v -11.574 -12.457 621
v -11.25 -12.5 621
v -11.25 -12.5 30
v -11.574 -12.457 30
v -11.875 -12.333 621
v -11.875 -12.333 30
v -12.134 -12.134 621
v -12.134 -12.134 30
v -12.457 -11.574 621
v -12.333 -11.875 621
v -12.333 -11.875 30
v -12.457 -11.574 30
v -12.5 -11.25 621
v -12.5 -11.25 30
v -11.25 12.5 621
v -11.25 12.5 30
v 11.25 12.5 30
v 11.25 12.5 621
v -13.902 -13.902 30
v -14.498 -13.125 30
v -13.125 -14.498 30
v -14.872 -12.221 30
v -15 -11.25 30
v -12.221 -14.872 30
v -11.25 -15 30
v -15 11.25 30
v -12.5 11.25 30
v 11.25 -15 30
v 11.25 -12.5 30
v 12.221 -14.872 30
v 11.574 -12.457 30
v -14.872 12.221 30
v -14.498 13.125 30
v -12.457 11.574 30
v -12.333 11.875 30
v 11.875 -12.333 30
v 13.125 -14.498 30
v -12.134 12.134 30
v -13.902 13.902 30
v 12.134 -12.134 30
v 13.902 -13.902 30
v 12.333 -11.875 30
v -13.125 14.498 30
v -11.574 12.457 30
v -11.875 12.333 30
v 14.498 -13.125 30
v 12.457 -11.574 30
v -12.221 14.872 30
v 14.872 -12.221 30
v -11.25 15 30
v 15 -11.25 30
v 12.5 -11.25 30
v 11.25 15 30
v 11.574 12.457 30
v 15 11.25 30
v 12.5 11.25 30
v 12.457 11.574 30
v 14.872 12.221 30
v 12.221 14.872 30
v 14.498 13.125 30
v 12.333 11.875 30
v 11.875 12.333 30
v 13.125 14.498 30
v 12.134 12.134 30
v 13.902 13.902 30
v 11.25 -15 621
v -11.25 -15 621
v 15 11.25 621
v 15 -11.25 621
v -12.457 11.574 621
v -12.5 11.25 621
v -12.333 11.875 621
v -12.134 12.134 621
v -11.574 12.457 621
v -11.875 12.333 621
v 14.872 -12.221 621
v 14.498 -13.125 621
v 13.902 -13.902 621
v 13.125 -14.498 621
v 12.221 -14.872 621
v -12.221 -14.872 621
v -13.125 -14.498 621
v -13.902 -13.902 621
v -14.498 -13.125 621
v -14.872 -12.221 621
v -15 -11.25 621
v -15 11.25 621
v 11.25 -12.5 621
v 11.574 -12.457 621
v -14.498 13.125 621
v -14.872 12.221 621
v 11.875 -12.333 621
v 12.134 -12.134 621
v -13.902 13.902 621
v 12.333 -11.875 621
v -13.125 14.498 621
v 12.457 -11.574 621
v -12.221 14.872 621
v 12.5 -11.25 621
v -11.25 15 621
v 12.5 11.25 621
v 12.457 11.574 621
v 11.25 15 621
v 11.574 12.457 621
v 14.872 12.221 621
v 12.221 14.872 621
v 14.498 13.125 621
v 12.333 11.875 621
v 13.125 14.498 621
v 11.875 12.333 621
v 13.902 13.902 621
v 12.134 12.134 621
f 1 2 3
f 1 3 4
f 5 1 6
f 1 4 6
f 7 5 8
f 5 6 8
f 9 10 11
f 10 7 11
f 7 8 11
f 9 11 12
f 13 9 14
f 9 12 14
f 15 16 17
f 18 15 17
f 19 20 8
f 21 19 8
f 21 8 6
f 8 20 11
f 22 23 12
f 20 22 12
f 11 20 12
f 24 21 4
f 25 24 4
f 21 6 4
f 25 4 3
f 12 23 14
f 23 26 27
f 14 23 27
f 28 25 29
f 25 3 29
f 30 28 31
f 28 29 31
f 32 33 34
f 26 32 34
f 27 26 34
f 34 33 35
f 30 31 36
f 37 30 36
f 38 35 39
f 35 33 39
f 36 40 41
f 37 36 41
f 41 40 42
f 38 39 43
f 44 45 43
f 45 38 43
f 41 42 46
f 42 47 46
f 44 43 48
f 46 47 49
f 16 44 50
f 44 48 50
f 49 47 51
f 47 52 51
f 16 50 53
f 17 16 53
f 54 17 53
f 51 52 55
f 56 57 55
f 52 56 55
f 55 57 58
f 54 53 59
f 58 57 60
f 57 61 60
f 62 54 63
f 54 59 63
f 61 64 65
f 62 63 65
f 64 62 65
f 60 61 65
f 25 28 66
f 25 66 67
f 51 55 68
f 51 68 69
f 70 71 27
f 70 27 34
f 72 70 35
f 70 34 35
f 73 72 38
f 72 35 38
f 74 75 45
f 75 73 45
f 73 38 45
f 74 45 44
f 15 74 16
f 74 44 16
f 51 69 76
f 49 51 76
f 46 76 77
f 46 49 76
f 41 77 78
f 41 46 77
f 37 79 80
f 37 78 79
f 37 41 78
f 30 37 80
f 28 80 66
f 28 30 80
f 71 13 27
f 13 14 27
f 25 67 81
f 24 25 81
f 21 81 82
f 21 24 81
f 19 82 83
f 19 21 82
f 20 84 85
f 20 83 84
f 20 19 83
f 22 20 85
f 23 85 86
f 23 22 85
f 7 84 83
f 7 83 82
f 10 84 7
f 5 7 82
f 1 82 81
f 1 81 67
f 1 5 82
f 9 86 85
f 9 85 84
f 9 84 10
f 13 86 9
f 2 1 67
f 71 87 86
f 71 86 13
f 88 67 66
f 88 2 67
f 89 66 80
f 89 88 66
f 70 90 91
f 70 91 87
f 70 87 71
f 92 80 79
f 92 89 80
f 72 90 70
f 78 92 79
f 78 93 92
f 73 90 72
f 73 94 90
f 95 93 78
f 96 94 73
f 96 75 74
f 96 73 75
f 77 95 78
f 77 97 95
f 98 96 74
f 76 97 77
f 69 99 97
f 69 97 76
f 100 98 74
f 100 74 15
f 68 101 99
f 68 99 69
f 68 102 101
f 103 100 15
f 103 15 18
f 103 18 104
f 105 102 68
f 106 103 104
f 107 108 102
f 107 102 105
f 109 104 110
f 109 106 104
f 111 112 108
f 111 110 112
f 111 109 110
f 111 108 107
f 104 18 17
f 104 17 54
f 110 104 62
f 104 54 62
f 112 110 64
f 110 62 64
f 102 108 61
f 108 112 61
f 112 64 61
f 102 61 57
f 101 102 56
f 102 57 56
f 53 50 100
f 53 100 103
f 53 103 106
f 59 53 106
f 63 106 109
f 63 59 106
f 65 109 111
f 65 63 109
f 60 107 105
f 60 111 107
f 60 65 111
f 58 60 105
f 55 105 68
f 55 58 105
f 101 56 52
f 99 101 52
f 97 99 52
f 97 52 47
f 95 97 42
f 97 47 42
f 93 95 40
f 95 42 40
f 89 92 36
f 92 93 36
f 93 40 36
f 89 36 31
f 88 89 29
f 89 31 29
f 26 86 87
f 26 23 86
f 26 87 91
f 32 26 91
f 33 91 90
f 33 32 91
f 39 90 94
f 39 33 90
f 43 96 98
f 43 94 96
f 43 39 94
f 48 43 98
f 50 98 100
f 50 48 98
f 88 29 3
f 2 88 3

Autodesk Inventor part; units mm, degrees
ref_plane "Start plane" through (0, 0, 30) normal (0, 0, 1) x (1, 0, 0)
ref_plane "End plane" through (0, 0, 621) normal (0, 0, 1) x (1, 0, 0)
sketch "Sketch" plane through (0, 0, 0) normal (0, 0, 1) x (1, 0, 0)
  line L0 (-15, -11.25) -> (-15, 11.25)
  line L1 (-11.25, 15) -> (11.25, 15)
  line L2 (15, 11.25) -> (15, -11.25)
  line L3 (11.25, -15) -> (-11.25, -15)
  arc A0 (-15, -11.25) -> (-11.25, -15) centre (-11.25, -11.25) ccw
  arc A1 (-11.25, 15) -> (-15, 11.25) centre (-11.25, 11.25) ccw
  arc A2 (15, 11.25) -> (11.25, 15) centre (11.25, 11.25) ccw
  arc A3 (11.25, -15) -> (15, -11.25) centre (11.25, -11.25) ccw
  arc A4 (-11.25, 12.5) -> (-12.5, 11.25) centre (-11.25, 11.25) ccw
  line L4 (-11.25, 12.5) -> (11.25, 12.5)
  arc A5 (12.5, 11.25) -> (11.25, 12.5) centre (11.25, 11.25) ccw
  line L5 (12.5, 11.25) -> (12.5, -11.25)
  arc A6 (11.25, -12.5) -> (12.5, -11.25) centre (11.25, -11.25) ccw
  line L6 (11.25, -12.5) -> (-11.25, -12.5)
  arc A7 (-12.5, -11.25) -> (-11.25, -12.5) centre (-11.25, -11.25) ccw
  line L7 (-12.5, -11.25) -> (-12.5, 11.25)
  line L8 (0, 22.0873) -> (0, -22.0873) construction
  line L9 (-22.0873, 0) -> (22.0873, 0) construction
  dimension "d7" = 3.75
  dimension "d10" = 30
  dimension "d11" = 30
  dimension "d12" = 2.5
  dimension "d15" = 15
  dimension "d16" = 15
extrude "Body" add sketch "Sketch" along normal up to surface (591 mm away) from surface at 30
sketch "Sketch3" plane through (0, 0, 0) normal (0, 0, 1) x (1, 0, 0)
  line L0 (0, 0) -> (10, 0)
ref_plane "Work Plane3" through (0, 0, 0) normal (0, -1, 0) x (1, 0, 0)
sketch "Sketch4" plane through (0, 0, 0) normal (0, -1, 0) x (1, 0, 0)
  line L0 (-2, 30) -> (12, 30)
  line L1 (-2, 621) -> (12, 621)
  dimension "d18" = 591
ref_plane "Work Plane5" through (1238.8, 45, 30) normal (0, 0, -1) x (-1, 0, 0)
split "Split2" plane through (1238.8, 45, 30) removes the side toward (0, 0, -1)
ref_plane "Work Plane6" through (1297, -11.25, 621) normal (0, 0, 1) x (1, 0, 0)
split "Split3" plane through (1297, -11.25, 621) removes the side toward (0, 0, 1)
equation "\"d7\" = G_IR"
equation "\"d10\" = G_H"
equation "\"d11\" = G_W"
equation "\"d12\" = G_T"
equation "\"d15\" = 0.5 * d10"
equation "\"d16\" = 0.5 * d11"
equation "\"d3\" = G_L"
equation "\"G_W\" = 30"
equation "\"G_H\" = 30"
equation "\"G_T\" = 2.5"
equation "\"G_IR\" = 3.75"
equation "\"G_L\" = d18"
equation "\"d14\" = G_OFFSET_END + B_L"
equation "\"B_L\" = 651"
equation "\"G_OFFSET_END\" = -30"
properties part number "DIN EN 10305-5 - 30 x 30 x 2,5  - 591" material "Steel, Mild"
